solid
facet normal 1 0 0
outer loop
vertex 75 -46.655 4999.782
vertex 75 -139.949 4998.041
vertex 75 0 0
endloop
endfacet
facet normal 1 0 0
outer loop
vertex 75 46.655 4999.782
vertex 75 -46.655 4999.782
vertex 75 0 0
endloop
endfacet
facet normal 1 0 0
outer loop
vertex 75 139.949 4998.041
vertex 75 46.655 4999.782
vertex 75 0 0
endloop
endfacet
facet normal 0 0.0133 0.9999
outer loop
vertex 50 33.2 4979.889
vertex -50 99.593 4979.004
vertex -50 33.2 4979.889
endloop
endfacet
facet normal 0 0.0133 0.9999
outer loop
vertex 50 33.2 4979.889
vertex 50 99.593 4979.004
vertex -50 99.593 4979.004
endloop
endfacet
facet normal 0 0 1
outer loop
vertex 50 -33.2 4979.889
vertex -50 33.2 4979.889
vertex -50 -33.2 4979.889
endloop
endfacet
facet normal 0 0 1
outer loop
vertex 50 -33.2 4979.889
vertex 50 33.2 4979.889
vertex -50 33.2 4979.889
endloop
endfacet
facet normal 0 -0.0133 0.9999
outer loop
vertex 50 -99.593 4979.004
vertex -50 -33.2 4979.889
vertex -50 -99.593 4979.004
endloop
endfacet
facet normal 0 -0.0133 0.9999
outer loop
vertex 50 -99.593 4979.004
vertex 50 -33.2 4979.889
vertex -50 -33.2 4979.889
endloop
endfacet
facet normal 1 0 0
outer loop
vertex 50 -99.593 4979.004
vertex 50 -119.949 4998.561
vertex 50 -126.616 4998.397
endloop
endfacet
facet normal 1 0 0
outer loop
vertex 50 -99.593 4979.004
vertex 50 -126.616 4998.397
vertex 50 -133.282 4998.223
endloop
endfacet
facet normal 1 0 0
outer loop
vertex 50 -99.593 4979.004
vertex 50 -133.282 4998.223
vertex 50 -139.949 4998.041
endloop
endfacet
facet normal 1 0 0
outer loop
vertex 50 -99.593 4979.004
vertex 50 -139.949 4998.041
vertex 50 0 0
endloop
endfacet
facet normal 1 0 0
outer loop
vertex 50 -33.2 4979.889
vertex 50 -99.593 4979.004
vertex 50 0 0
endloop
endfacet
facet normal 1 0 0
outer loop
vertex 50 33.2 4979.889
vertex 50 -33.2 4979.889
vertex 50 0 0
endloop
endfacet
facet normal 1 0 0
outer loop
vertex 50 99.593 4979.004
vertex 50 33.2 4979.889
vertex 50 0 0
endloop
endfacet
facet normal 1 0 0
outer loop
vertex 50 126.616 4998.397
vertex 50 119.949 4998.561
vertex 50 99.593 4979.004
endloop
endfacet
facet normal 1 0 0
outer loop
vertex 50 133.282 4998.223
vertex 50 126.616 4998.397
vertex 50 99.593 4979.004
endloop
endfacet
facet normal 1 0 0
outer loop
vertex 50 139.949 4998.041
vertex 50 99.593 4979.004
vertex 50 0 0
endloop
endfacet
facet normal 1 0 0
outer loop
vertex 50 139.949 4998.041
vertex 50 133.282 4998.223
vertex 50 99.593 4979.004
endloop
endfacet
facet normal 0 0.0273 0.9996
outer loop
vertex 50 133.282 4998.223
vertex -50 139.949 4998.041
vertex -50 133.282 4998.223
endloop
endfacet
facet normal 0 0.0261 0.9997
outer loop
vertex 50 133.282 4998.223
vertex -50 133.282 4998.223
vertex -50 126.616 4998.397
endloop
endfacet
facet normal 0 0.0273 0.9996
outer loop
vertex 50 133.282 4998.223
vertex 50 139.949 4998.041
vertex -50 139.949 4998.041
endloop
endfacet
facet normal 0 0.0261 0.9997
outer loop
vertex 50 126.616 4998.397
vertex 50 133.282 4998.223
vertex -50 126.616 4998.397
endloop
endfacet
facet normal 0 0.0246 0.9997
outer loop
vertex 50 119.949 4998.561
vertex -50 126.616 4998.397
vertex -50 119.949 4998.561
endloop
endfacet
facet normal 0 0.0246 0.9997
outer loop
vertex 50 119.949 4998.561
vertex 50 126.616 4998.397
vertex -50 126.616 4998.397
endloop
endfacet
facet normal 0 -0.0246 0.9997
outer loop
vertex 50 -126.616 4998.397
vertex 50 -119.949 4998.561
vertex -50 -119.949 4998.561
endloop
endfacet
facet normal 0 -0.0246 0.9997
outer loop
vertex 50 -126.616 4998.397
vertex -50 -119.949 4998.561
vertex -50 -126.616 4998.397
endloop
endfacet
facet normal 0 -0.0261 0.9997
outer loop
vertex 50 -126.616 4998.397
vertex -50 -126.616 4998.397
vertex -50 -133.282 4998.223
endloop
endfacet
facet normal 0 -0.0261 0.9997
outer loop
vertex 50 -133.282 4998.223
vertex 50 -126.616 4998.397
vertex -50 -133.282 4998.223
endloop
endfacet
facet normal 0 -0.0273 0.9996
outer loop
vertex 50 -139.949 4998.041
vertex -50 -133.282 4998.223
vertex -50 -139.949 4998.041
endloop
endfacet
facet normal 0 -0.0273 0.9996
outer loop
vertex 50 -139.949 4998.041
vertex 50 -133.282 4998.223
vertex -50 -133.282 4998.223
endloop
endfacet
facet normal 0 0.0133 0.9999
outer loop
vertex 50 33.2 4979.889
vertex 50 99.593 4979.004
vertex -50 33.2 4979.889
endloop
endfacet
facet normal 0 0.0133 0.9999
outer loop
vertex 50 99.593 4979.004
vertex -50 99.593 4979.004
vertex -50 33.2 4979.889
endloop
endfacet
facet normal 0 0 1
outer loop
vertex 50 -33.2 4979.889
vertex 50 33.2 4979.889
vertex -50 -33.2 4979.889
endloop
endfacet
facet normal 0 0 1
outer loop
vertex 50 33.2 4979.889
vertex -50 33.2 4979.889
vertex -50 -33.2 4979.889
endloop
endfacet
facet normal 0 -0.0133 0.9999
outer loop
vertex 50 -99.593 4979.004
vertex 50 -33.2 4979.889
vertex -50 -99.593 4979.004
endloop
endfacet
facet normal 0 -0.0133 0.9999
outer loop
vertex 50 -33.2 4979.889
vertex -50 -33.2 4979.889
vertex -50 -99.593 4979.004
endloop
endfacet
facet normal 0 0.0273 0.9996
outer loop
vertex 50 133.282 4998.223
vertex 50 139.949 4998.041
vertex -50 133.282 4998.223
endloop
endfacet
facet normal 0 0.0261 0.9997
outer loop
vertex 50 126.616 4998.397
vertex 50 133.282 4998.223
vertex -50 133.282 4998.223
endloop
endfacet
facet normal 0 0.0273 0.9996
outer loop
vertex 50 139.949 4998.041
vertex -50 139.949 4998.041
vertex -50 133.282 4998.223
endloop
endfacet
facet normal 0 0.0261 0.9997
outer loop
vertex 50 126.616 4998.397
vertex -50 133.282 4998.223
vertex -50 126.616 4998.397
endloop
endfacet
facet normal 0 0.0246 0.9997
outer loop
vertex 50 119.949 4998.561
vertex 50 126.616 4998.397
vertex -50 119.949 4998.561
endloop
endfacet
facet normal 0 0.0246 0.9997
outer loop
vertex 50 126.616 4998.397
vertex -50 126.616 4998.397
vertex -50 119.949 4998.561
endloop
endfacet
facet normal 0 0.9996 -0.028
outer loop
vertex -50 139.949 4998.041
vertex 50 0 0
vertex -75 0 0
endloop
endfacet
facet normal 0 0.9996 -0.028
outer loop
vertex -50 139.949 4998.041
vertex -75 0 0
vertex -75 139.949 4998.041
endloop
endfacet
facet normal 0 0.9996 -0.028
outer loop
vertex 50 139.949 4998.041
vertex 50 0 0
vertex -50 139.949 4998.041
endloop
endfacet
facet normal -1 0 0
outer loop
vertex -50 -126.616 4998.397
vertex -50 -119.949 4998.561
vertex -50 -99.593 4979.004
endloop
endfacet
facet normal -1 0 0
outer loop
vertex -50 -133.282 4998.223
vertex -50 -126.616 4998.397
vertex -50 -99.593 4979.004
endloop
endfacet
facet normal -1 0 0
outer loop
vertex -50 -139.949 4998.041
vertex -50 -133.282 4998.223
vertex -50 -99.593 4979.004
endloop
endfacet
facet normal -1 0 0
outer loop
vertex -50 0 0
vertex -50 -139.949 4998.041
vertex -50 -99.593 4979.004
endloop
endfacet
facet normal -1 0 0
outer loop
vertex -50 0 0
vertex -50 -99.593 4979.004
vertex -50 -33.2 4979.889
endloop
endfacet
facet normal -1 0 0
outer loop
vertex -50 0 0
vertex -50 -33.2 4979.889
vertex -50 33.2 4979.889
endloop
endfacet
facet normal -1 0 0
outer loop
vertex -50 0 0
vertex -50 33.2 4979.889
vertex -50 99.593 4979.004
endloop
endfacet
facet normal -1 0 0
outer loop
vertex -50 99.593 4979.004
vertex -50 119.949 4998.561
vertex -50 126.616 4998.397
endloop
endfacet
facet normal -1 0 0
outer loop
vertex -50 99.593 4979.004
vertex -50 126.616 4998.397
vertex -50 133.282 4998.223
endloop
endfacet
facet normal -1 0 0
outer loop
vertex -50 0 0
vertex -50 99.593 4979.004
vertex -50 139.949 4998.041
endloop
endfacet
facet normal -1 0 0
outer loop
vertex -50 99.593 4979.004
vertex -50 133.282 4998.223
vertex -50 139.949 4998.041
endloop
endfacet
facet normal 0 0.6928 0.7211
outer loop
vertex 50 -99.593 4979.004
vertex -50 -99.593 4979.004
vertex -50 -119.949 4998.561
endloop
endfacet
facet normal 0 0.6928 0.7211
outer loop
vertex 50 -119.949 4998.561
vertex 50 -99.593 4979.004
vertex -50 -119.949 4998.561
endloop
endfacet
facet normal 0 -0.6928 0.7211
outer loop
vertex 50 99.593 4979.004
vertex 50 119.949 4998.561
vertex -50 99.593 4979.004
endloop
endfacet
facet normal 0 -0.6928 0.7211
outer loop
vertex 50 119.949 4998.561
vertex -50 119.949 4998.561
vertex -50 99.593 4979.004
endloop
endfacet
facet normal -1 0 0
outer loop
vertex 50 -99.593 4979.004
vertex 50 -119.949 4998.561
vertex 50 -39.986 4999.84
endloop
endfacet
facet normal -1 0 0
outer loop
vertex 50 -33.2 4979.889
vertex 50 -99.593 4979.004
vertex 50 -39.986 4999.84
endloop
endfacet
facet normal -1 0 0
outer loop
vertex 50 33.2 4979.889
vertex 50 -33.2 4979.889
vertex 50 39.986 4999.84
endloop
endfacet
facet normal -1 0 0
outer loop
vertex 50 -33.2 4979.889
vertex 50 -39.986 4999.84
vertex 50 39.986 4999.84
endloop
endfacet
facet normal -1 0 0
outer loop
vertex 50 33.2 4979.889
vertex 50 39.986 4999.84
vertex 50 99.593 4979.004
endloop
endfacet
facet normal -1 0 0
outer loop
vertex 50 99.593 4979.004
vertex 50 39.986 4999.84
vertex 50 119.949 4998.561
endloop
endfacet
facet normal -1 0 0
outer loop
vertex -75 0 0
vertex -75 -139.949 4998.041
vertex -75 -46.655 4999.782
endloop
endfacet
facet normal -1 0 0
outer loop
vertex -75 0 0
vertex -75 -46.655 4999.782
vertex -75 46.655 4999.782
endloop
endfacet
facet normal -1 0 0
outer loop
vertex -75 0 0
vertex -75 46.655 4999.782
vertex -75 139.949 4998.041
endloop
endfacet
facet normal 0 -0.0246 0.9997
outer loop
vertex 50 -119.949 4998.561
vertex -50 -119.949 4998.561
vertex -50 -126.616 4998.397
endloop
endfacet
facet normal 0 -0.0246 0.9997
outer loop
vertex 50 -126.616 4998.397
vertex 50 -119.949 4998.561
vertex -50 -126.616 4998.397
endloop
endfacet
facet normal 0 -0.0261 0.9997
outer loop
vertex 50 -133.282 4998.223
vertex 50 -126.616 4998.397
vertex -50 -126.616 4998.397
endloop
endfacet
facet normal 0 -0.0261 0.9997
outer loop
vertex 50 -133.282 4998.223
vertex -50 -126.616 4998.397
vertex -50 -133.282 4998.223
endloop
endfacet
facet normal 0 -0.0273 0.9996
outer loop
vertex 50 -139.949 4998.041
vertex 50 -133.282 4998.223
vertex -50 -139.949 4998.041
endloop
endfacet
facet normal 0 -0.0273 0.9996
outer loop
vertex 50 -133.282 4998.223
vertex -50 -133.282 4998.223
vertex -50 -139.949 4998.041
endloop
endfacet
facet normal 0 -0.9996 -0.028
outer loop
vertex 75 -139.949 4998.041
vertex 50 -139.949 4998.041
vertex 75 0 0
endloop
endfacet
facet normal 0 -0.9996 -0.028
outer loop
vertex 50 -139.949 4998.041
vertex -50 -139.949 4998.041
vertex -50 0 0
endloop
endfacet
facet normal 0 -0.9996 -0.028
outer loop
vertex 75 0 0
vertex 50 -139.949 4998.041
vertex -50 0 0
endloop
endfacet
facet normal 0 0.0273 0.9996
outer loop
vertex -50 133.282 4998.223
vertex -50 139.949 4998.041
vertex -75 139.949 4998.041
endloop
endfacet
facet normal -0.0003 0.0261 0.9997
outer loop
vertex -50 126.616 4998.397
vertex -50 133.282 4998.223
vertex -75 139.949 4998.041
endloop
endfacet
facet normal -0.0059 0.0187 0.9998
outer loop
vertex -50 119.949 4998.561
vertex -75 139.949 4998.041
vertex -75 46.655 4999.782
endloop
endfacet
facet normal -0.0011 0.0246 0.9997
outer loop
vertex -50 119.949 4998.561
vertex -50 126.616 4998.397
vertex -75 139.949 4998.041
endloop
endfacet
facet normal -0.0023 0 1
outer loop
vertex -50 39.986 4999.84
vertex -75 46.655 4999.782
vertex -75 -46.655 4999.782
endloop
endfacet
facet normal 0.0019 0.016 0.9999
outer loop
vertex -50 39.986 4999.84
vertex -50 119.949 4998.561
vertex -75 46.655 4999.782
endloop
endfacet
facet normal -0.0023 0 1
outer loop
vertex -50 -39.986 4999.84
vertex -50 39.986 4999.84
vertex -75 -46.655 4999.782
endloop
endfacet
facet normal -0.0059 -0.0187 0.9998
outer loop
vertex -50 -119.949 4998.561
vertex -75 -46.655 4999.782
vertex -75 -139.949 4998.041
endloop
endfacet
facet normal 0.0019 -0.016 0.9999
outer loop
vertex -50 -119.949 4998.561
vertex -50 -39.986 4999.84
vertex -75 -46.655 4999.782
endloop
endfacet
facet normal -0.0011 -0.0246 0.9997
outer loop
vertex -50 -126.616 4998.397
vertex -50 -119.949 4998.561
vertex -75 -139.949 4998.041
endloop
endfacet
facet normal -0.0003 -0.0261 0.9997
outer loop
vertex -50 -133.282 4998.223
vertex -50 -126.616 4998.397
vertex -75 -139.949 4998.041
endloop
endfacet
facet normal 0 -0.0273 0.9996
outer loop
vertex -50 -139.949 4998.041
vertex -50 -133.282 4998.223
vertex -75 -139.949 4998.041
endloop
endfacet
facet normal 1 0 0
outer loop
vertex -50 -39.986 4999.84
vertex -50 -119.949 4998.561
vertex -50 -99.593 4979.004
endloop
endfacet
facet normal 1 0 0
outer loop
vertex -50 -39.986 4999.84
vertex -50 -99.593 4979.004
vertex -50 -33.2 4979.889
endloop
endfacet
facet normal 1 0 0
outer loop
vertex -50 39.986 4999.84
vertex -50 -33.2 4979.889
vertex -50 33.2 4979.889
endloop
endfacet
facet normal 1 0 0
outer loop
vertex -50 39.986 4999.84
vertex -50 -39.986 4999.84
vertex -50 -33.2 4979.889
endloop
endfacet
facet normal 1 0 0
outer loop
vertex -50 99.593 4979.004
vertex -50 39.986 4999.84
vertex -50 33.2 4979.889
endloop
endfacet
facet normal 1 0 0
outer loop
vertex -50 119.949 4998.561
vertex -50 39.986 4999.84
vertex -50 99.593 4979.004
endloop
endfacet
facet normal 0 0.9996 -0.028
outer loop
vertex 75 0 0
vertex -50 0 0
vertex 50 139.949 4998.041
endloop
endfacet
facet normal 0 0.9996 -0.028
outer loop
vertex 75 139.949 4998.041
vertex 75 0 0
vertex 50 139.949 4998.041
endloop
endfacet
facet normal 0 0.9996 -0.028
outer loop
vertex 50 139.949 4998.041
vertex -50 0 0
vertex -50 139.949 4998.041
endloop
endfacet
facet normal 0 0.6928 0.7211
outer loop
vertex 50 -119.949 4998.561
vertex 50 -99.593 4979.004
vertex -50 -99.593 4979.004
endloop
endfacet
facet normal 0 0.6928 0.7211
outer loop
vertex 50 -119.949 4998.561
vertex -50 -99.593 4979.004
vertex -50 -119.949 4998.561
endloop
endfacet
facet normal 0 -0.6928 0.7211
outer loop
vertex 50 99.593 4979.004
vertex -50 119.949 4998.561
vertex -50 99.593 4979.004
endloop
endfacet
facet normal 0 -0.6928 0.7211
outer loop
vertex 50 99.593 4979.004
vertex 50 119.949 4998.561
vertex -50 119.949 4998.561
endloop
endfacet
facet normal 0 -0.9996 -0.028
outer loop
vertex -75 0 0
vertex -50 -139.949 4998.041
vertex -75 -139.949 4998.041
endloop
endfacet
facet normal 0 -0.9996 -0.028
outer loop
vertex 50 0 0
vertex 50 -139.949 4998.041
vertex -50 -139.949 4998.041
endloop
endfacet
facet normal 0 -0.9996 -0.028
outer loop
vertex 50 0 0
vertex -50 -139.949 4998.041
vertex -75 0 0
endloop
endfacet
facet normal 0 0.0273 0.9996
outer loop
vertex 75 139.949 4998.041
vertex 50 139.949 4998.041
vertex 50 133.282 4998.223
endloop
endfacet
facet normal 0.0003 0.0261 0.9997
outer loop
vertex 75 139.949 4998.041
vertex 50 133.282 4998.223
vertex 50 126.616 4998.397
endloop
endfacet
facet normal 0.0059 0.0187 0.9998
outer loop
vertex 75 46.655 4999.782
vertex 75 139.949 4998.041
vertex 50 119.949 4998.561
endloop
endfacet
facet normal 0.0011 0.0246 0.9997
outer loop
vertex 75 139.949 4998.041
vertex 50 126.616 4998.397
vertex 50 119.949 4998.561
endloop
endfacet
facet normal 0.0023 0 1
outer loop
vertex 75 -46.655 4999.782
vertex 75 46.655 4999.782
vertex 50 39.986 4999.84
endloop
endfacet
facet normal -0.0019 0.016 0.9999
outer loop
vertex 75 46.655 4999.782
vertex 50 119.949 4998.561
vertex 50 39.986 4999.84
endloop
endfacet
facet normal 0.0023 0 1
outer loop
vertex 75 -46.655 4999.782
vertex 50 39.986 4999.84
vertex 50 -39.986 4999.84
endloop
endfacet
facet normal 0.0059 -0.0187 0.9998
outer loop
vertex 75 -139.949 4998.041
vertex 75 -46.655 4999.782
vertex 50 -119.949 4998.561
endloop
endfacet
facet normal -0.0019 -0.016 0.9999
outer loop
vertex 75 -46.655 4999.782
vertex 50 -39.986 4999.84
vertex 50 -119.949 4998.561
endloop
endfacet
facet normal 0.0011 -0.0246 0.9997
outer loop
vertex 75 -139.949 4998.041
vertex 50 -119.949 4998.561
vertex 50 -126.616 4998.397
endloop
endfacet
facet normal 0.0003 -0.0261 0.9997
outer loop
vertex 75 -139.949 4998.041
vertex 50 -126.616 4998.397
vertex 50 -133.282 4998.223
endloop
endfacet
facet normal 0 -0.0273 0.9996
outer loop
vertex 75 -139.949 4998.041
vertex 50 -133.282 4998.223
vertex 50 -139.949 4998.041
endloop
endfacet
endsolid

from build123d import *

# Parameters (mm, degrees)
F1_DEPTH = 50
F3_DEPTH = 25


with BuildPart() as f1:
    # F0 (on Right) → F1 (new body, symmetric)
    with BuildSketch(Plane.YZ):
        with BuildLine():
            ThreePointArc((99.5933601328, 4979.0040331996), (49.7991700041, 4979.751002075), (0, 4980))
            ThreePointArc((0, 4980), (-49.7991700041, 4979.751002075), (-99.5933601328, 4979.0040331996))
            Line((-99.5933601328, 4979.0040331996), (-119.9487038483, 4998.5610237793))
            ThreePointArc((-119.9487038483, 4998.5610237793), (-129.9489639222, 4998.3110414194), (-139.9487038483, 4998.0410522815))
            Line((-139.9487038483, 4998.0410522815), (0, 0))
            Line((0, 0), (139.9487038483, 4998.0410522815))
            ThreePointArc((139.9487038483, 4998.0410522815), (129.9489639222, 4998.3110414194), (119.9487038483, 4998.5610237793))
            Line((119.9487038483, 4998.5610237793), (99.5933601328, 4979.0040331996))
        make_face()
    extrude(amount=F1_DEPTH, both=True)

    # F2 (on face) → F3 (join)
    with BuildSketch(Plane.YZ.offset(50)):
        with BuildLine():
            Line((0, 0), (139.9487038483, 4998.0410522815))
            ThreePointArc((139.9487038483, 4998.0410522815), (0, 5000), (-139.9487038483, 4998.0410522815))
            Line((-139.9487038483, 4998.0410522815), (0, 0))
        make_face()
    extrude(amount=F3_DEPTH)


with BuildPart() as f4_1:
    # F4: instance of F1
    add(f1.part.mirror(Plane.YZ))


solid = Compound([f1.part, f4_1.part])
